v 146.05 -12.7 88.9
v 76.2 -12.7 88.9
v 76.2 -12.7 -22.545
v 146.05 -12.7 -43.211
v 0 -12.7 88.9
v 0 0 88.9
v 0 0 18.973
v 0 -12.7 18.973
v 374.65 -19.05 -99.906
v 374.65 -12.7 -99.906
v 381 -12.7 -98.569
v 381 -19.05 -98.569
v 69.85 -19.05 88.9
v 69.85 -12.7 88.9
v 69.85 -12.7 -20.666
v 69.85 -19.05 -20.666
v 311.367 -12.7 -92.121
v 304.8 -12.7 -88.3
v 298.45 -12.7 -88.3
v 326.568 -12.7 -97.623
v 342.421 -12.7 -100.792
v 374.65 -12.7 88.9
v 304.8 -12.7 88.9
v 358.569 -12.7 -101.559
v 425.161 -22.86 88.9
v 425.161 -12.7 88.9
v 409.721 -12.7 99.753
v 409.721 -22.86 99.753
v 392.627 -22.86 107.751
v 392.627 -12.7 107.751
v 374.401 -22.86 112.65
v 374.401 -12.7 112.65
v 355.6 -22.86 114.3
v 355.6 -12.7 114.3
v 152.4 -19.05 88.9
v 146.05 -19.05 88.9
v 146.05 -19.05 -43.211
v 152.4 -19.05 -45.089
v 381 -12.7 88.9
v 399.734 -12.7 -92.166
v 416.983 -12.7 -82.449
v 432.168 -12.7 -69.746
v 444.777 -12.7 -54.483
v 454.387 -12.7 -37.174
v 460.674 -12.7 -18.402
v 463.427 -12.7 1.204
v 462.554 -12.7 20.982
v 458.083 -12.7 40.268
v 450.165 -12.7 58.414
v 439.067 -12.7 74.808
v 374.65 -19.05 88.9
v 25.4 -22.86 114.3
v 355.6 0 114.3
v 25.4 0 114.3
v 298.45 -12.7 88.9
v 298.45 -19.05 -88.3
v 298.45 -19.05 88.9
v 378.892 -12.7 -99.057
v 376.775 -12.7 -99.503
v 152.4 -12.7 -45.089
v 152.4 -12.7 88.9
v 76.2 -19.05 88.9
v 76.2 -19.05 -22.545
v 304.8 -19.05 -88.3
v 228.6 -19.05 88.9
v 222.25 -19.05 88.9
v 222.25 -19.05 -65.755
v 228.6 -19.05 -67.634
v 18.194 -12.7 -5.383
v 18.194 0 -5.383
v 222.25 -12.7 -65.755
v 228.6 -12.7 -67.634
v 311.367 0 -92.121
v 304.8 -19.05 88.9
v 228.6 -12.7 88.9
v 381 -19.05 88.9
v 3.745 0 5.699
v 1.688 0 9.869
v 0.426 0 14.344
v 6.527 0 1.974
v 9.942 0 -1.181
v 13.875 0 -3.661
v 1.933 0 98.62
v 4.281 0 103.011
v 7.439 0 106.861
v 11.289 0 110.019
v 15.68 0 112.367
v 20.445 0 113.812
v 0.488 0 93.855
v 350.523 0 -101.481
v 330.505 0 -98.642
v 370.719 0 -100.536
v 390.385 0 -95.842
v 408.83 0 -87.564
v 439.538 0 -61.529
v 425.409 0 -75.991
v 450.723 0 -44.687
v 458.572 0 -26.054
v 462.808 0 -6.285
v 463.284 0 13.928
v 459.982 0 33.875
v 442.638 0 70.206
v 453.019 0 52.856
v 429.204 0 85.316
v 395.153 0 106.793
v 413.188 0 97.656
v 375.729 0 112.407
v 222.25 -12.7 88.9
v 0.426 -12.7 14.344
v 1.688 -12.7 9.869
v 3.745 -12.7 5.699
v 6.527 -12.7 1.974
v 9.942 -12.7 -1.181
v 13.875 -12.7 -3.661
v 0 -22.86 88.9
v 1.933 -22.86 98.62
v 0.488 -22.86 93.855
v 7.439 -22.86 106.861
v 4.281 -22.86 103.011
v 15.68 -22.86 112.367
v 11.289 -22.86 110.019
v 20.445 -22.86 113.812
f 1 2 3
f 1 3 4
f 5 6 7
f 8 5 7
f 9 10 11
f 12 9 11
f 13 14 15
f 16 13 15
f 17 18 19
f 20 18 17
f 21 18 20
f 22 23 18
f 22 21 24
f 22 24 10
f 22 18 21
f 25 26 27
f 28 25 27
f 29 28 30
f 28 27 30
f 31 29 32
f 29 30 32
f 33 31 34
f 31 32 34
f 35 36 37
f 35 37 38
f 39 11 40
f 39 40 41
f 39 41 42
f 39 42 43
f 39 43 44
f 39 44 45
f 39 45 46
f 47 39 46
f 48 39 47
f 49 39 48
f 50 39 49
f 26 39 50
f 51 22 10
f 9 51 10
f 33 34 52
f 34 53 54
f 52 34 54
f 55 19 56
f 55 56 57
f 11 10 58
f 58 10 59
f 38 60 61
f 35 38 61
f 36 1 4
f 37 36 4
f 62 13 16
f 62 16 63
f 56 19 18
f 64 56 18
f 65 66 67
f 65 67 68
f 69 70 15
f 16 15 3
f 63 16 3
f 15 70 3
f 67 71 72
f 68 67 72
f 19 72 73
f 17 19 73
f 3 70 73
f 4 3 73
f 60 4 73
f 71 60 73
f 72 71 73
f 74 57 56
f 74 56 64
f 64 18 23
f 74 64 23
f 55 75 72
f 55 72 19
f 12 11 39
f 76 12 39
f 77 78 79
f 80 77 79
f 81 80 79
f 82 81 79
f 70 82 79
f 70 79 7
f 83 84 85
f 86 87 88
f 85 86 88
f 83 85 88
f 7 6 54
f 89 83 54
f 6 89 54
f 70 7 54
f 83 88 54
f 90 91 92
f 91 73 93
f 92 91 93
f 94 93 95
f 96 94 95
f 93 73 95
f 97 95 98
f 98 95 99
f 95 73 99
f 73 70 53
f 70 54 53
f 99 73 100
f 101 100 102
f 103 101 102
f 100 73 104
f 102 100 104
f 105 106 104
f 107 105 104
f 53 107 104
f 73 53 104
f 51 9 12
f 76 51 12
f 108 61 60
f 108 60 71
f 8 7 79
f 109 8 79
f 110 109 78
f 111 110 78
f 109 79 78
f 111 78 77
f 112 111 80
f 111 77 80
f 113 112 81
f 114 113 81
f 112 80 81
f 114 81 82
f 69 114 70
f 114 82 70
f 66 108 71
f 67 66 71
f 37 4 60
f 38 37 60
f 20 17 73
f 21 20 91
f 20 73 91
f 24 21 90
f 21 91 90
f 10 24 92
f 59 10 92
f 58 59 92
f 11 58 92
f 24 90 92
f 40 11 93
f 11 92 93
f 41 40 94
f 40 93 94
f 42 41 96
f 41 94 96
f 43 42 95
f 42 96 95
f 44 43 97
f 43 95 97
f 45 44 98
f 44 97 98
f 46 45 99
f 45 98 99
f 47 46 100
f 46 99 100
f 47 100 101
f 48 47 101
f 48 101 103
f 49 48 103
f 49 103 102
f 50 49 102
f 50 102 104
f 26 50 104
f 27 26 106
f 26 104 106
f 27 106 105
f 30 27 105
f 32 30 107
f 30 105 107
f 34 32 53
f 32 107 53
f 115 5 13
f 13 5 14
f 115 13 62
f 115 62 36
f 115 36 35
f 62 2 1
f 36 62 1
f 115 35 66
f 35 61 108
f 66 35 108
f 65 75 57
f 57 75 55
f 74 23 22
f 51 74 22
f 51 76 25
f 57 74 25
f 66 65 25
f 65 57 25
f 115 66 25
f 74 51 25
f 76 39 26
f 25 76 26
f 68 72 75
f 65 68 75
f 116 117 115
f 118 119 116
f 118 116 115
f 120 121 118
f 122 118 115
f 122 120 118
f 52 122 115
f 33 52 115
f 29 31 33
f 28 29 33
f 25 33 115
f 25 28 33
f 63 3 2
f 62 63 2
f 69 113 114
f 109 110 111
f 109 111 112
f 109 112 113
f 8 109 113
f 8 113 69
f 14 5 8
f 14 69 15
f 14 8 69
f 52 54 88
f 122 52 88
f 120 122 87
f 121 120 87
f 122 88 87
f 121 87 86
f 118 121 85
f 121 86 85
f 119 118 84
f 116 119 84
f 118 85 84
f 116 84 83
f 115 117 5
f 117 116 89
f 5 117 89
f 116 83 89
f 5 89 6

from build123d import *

# Parameters (mm, degrees)
F1_DEPTH = 12.7
F3_DEPTH = 10.16
F4_W     = 6.35
F4_H     = 177.1998706725
F5_DEPTH = 6.35


with BuildPart() as f1:
    # F0 (on Front) → F1 (new body)
    with BuildSketch(Plane.XZ):
        with BuildLine():
            Line((0, 88.9), (0, 18.9734820172))
            ThreePointArc((0, 18.9734820172), (5.0506124764, 3.7727442912), (18.1938919224, -5.3828725206))
            Line((18.1938919224, -5.3828725206), (311.3668292683, -92.1214634146))
            ThreePointArc((311.3668292683, -92.1214634146), (461.1537705997, -16.2686651285), (355.6, 114.3))
            Line((355.6, 114.3), (25.4, 114.3))
            ThreePointArc((25.4, 114.3), (7.4394877579, 106.8605122421), (0, 88.9))
        make_face()
    extrude(amount=F1_DEPTH)

    # F2 (on face) → F3 (join)
    with BuildSketch(Plane.XZ.offset(12.7)):
        with BuildLine():
            ThreePointArc((25.4, 114.3), (7.4394877579, 106.8605122421), (0, 88.9))
            Line((0, 88.9), (425.1607648032, 88.9))
            ThreePointArc((425.1607648032, 88.9), (392.6265445323, 107.751368334), (355.6, 114.3))
            Line((355.6, 114.3), (25.4, 114.3))
        make_face()
    extrude(amount=F3_DEPTH)

    # F4 (on face) → F5 (join)
    with BuildSketch(Plane.XZ.offset(12.7)):
        Polygon((76.2, 88.9), (69.85, 88.9), (69.85, -20.6659271787), (76.2, -22.5446478313), align=None)
        Polygon((152.4, 88.9), (146.05, 88.9), (146.05, -43.2105750099), (152.4, -45.0892956626), align=None)
        Polygon((228.6, 88.9), (222.25, 88.9), (222.25, -65.7552228412), (228.6, -67.6339434938), align=None)
        with Locations((301.625, 0.3000646637)):
            Rectangle(F4_W, F4_H)
        Polygon((381, 88.9), (374.65, 88.9), (374.65, -99.9058233698), (381, -98.5692189258), align=None)
    extrude(amount=F5_DEPTH)


solid = f1.part
